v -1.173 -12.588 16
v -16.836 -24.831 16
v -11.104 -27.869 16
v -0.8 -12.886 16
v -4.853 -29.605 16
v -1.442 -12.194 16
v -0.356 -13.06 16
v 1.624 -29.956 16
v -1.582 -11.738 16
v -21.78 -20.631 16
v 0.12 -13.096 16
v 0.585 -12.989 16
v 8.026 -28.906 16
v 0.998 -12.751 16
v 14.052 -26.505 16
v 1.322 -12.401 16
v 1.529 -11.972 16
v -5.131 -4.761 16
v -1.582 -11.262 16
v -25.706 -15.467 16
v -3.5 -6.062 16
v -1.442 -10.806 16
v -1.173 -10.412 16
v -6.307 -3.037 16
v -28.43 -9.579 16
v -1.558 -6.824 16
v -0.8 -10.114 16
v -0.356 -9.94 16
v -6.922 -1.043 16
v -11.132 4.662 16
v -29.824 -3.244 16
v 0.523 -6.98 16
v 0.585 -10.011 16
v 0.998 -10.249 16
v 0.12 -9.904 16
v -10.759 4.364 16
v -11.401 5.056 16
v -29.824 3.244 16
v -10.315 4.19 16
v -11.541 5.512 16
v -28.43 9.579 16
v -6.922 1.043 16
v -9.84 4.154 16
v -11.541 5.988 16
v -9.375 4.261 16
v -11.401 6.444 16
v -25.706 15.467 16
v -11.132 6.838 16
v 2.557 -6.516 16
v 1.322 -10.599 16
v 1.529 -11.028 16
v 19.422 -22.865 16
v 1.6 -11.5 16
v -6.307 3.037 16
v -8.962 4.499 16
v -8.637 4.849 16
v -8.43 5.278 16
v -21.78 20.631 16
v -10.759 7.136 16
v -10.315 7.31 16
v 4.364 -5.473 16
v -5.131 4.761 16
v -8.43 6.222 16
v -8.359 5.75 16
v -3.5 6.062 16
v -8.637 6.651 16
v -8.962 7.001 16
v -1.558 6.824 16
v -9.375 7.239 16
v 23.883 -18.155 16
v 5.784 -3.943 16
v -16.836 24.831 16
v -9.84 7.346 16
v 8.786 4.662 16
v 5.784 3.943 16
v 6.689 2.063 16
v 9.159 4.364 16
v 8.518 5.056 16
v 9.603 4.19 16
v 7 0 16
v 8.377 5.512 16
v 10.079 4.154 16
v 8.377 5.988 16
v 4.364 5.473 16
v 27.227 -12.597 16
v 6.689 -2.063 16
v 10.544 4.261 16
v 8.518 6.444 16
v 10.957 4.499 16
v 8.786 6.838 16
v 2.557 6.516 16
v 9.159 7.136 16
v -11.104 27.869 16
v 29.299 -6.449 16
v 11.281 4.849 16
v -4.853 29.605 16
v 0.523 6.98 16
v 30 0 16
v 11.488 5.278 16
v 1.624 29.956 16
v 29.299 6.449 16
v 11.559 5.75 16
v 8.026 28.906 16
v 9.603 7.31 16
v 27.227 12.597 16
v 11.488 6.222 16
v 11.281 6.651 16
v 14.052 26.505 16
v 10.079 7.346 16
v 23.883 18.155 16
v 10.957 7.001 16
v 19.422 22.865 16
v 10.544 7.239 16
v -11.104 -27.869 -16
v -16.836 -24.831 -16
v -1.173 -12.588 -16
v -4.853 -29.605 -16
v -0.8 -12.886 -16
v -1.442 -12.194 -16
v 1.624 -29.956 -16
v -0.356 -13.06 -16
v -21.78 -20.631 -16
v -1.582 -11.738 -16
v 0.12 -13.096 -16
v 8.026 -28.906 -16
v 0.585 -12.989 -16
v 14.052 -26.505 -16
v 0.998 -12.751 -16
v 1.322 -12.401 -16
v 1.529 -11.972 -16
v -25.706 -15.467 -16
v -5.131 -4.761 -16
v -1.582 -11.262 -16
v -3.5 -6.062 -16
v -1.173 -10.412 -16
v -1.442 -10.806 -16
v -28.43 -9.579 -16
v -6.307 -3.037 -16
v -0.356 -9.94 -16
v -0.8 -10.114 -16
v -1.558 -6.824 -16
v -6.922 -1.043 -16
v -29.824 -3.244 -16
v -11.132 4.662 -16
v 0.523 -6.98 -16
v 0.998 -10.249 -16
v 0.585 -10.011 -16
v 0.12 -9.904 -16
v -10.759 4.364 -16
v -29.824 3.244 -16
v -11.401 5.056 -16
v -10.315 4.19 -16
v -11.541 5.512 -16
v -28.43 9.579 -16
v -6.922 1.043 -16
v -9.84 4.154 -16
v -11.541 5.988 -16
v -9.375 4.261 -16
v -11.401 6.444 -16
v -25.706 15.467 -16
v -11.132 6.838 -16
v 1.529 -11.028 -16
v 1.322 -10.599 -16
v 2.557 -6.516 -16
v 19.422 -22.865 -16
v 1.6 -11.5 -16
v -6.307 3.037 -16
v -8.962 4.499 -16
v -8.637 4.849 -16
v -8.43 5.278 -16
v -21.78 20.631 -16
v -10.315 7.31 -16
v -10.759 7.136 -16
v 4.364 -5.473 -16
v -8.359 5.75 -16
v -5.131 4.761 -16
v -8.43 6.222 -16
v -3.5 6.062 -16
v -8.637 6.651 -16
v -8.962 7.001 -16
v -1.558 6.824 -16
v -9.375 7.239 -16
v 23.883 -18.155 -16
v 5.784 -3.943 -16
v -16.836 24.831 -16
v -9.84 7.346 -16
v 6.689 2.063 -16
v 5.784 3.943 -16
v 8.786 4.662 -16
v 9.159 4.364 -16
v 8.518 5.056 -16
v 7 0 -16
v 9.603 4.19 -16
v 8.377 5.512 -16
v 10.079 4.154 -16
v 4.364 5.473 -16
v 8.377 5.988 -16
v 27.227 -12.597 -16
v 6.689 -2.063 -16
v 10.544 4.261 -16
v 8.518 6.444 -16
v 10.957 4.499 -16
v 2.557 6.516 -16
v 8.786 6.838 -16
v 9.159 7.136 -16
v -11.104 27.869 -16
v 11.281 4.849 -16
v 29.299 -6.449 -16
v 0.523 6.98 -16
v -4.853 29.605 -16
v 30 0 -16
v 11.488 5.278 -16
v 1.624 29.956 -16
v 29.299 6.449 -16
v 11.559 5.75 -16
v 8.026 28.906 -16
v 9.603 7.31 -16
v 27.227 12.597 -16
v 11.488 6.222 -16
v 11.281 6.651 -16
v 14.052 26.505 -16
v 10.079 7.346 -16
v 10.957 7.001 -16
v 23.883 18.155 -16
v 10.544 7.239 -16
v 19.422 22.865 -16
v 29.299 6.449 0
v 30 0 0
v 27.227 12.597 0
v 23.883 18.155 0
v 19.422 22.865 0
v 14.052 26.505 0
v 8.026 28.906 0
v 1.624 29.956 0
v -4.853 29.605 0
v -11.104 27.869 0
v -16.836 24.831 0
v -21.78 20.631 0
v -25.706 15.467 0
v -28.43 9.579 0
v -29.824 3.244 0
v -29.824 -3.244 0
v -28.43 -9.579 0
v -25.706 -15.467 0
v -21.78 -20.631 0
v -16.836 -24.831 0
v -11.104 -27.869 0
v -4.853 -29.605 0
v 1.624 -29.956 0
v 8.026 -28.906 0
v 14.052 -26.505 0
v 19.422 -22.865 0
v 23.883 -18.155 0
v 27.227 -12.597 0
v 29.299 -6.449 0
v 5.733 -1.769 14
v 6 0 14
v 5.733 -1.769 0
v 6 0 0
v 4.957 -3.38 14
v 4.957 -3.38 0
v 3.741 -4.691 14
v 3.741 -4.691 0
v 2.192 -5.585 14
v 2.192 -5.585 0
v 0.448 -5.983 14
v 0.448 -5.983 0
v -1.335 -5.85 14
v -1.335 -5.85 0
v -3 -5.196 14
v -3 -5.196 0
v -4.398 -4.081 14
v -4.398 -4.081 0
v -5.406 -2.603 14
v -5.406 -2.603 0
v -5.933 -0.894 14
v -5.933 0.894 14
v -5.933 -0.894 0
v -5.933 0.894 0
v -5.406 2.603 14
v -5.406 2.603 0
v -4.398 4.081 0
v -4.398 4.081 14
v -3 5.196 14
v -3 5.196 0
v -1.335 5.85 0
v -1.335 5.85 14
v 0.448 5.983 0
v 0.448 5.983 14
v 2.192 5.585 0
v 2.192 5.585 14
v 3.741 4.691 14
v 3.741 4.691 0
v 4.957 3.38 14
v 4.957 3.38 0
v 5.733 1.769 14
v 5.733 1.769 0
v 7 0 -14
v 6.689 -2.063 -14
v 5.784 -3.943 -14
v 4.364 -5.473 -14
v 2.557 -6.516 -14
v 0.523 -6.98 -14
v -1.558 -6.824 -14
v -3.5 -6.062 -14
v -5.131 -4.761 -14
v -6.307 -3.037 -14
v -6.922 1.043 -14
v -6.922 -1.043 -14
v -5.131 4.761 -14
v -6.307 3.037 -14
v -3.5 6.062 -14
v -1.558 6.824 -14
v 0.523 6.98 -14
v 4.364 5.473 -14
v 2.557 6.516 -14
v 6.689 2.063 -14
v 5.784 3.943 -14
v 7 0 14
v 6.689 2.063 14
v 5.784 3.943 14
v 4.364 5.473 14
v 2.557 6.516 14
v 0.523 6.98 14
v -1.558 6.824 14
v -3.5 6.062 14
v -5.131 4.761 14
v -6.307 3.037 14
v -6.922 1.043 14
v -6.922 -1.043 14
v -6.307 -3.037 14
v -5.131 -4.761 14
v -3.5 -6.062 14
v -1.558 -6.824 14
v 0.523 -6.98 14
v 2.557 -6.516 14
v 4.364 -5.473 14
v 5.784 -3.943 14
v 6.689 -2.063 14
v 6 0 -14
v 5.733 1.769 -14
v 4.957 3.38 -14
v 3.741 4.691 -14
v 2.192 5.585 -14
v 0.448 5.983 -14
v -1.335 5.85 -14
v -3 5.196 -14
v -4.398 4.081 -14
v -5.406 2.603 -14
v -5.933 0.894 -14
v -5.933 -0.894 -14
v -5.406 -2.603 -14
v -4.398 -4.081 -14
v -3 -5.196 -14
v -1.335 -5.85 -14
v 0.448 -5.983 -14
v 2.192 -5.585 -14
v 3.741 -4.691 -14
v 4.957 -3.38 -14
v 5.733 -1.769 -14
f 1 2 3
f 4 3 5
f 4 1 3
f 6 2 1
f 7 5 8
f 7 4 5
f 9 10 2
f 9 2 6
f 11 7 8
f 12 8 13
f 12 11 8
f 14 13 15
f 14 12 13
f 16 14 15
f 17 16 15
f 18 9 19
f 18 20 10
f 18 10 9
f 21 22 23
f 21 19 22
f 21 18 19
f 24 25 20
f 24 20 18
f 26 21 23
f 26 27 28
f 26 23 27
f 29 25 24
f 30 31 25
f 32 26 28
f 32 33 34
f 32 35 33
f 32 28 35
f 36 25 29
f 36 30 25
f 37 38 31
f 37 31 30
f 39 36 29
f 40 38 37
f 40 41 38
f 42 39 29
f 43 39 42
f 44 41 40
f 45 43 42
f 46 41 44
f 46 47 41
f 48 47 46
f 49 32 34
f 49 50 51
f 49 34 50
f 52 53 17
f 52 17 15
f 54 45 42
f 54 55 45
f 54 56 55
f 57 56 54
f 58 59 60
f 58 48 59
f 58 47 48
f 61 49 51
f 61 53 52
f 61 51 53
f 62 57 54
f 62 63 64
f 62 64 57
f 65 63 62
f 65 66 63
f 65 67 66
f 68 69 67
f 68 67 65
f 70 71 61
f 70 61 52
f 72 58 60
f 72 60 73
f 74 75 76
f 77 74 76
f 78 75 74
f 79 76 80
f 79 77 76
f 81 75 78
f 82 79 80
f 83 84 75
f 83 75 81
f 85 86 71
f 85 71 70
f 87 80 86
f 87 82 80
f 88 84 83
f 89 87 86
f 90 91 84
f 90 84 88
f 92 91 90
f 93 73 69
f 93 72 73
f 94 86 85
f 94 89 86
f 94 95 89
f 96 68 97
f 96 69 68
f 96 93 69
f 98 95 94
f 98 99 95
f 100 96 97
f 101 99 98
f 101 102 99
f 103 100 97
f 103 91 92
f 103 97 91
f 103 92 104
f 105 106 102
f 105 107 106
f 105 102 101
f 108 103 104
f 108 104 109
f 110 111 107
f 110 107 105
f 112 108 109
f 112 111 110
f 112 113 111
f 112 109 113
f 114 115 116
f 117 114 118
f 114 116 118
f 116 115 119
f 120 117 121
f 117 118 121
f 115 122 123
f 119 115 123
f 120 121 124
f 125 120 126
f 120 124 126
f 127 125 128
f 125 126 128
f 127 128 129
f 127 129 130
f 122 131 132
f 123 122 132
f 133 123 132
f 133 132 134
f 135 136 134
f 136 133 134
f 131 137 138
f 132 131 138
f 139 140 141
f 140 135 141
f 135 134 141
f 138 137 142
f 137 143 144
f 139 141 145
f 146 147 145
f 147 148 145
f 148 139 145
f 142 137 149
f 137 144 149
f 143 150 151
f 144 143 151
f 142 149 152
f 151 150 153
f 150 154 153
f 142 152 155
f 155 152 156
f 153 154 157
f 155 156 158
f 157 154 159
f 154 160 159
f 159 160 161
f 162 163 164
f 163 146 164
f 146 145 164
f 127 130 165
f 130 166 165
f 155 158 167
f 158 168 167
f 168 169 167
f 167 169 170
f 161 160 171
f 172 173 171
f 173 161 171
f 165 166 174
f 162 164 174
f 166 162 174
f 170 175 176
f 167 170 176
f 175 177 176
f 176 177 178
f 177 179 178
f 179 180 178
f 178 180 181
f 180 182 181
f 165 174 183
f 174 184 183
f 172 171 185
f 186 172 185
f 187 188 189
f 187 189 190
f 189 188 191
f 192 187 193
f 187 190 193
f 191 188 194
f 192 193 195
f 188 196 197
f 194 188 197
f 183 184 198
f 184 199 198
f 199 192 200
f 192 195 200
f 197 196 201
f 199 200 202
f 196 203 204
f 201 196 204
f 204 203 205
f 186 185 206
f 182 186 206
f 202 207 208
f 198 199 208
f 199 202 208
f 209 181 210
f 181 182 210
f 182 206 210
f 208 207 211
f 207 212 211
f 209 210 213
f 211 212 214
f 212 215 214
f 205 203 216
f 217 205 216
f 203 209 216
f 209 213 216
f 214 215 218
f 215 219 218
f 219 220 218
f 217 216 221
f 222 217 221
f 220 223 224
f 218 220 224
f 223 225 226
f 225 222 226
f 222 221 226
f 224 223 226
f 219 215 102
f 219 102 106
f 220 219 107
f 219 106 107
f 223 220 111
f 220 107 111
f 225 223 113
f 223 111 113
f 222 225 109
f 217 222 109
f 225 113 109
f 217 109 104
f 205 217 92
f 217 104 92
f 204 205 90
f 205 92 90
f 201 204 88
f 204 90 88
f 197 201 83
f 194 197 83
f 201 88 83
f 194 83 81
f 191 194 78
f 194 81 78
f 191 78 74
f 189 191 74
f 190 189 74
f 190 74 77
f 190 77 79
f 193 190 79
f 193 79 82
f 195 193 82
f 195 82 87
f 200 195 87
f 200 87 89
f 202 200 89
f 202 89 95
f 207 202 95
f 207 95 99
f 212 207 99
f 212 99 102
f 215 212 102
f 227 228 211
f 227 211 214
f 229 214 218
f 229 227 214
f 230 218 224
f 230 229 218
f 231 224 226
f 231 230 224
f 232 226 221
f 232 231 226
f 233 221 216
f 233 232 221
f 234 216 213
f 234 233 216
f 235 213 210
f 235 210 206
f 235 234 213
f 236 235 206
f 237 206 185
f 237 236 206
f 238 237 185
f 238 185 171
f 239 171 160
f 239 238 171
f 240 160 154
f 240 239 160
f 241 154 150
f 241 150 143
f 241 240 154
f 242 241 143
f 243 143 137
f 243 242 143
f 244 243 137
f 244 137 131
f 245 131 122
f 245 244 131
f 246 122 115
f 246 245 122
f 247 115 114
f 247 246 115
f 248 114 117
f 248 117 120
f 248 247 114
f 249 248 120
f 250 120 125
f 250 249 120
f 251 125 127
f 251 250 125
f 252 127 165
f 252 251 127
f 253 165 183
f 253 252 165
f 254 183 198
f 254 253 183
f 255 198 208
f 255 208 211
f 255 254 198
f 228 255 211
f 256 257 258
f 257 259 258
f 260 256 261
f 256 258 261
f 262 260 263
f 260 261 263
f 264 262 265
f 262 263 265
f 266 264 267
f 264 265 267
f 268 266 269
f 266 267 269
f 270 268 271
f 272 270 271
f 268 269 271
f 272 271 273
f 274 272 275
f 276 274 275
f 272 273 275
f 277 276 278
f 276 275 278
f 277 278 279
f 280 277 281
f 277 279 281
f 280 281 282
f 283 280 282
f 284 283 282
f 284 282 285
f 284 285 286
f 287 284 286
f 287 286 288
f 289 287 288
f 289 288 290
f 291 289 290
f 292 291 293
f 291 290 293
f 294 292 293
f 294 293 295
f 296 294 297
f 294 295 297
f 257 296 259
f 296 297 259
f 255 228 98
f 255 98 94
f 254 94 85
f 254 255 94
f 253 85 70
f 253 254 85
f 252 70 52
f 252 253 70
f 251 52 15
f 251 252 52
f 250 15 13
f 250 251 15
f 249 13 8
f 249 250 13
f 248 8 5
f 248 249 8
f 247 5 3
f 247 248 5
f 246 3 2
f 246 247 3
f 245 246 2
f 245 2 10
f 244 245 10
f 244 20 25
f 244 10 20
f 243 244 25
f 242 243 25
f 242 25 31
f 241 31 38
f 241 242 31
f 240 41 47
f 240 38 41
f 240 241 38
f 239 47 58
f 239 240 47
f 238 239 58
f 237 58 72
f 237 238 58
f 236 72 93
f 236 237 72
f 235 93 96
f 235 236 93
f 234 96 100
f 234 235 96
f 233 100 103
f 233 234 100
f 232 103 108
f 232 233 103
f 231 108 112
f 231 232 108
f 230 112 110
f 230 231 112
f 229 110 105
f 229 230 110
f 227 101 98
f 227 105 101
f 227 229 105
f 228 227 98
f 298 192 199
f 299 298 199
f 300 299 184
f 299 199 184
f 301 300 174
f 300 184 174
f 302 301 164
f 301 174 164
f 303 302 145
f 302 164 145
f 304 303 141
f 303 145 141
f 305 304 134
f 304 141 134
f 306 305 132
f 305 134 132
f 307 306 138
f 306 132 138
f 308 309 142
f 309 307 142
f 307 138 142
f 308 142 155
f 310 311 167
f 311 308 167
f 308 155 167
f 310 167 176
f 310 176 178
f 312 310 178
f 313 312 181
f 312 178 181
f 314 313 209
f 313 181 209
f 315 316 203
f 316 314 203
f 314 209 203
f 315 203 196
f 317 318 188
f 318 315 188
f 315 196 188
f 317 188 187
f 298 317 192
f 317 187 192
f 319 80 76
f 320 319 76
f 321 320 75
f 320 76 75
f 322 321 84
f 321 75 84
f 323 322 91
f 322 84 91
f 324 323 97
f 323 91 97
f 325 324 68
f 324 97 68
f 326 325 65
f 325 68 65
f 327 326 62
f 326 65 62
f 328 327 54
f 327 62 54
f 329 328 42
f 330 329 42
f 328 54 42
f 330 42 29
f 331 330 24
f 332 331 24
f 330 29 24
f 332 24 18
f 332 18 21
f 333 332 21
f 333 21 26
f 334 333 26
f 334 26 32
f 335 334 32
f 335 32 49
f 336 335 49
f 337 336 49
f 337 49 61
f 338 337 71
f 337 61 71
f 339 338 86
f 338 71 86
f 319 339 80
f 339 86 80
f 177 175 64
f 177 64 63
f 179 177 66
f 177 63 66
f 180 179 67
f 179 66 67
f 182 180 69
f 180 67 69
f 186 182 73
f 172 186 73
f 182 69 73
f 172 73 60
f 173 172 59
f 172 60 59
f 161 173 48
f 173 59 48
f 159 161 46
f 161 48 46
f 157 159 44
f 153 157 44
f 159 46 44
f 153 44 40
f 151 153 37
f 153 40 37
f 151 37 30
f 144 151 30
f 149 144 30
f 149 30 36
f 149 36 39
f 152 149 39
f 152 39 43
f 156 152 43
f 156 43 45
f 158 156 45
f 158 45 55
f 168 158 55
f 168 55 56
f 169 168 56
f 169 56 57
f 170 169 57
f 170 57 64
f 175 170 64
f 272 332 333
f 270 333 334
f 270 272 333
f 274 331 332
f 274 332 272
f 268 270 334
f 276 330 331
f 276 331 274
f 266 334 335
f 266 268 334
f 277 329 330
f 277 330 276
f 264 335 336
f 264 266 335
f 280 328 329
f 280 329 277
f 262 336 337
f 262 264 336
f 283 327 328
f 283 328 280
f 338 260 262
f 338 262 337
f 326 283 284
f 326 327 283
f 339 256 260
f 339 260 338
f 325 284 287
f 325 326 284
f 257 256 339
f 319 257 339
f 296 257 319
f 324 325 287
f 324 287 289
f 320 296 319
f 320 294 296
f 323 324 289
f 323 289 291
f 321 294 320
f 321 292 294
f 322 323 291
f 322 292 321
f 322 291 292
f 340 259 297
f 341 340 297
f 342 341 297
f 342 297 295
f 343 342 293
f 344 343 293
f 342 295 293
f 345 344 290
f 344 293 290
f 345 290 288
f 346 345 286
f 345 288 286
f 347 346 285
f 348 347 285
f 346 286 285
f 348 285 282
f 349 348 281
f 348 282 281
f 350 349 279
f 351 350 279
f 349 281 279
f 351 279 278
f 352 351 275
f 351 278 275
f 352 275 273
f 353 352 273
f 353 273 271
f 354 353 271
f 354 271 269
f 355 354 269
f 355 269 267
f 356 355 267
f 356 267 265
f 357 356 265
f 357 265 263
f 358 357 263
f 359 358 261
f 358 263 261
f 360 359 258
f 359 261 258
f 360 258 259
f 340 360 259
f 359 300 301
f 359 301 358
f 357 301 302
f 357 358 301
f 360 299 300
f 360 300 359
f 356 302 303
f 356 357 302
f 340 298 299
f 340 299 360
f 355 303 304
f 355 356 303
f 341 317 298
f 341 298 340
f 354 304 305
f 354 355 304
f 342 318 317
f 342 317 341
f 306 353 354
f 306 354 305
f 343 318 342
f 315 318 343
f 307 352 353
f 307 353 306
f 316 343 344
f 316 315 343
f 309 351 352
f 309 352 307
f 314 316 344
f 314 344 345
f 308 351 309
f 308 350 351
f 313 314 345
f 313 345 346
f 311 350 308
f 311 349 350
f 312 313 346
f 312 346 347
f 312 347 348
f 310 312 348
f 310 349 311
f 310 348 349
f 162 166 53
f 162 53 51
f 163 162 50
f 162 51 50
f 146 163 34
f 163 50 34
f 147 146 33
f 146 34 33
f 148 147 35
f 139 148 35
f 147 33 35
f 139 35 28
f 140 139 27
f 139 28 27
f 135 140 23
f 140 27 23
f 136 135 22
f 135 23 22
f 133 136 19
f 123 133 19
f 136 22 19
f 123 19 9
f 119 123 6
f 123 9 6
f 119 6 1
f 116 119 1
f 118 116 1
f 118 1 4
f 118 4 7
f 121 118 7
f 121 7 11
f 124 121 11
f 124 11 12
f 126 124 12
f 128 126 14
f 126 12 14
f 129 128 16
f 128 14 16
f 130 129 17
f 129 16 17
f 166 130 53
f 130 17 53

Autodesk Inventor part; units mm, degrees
ref_plane "YZ Plane" through (0, 0, 0) normal (1, 0, 0) x (0, 1, 0)
ref_plane "XZ Plane" through (0, 0, 0) normal (0, 1, 0) x (-1, 0, 0)
ref_plane "XY Plane" through (0, 0, 0) normal (0, 0, 1) x (1, 0, 0)
sketch "スケッチ1" plane through (0, 0, 0) normal (0, 0, 1) x (1, 0, 0)
  circle A0 centre (0, 0) radius 30
  circle A1 centre (0, 0) radius 6
  dimension "d0" = 12
  dimension "d1" = 60
extrude "押し出し1" add sketch "スケッチ1" along normal mid plane 32
sketch "スケッチ3" plane through (0, 0, 16) normal (0, 0, 1) x (1, 0, 0)
  circle A0 centre (0, 0) radius 11.5 construction
  circle A1 centre (-9.9593, 5.75) radius 1.6
  circle A2 centre (0, -11.5) radius 1.6
  circle A3 centre (9.9593, 5.75) radius 1.6
  dimension "d7" = 23
  dimension "d8" = 3.2
  dimension "d11" = 360
extrude "押し出し3" cut sketch "スケッチ3" against normal through all
sketch "スケッチ2" plane through (0, 0, 16) normal (0, 0, 1) x (1, 0, 0)
  circle A0 centre (0, 0) radius 7
  dimension "d4" = 14
extrude "押し出し2" cut sketch "スケッチ2" against normal blind 2
mirror "ミラー1" about plane through (0, 0, 0) normal (0, 0, 1) of "押し出し2"
properties part number "mecanumL"
